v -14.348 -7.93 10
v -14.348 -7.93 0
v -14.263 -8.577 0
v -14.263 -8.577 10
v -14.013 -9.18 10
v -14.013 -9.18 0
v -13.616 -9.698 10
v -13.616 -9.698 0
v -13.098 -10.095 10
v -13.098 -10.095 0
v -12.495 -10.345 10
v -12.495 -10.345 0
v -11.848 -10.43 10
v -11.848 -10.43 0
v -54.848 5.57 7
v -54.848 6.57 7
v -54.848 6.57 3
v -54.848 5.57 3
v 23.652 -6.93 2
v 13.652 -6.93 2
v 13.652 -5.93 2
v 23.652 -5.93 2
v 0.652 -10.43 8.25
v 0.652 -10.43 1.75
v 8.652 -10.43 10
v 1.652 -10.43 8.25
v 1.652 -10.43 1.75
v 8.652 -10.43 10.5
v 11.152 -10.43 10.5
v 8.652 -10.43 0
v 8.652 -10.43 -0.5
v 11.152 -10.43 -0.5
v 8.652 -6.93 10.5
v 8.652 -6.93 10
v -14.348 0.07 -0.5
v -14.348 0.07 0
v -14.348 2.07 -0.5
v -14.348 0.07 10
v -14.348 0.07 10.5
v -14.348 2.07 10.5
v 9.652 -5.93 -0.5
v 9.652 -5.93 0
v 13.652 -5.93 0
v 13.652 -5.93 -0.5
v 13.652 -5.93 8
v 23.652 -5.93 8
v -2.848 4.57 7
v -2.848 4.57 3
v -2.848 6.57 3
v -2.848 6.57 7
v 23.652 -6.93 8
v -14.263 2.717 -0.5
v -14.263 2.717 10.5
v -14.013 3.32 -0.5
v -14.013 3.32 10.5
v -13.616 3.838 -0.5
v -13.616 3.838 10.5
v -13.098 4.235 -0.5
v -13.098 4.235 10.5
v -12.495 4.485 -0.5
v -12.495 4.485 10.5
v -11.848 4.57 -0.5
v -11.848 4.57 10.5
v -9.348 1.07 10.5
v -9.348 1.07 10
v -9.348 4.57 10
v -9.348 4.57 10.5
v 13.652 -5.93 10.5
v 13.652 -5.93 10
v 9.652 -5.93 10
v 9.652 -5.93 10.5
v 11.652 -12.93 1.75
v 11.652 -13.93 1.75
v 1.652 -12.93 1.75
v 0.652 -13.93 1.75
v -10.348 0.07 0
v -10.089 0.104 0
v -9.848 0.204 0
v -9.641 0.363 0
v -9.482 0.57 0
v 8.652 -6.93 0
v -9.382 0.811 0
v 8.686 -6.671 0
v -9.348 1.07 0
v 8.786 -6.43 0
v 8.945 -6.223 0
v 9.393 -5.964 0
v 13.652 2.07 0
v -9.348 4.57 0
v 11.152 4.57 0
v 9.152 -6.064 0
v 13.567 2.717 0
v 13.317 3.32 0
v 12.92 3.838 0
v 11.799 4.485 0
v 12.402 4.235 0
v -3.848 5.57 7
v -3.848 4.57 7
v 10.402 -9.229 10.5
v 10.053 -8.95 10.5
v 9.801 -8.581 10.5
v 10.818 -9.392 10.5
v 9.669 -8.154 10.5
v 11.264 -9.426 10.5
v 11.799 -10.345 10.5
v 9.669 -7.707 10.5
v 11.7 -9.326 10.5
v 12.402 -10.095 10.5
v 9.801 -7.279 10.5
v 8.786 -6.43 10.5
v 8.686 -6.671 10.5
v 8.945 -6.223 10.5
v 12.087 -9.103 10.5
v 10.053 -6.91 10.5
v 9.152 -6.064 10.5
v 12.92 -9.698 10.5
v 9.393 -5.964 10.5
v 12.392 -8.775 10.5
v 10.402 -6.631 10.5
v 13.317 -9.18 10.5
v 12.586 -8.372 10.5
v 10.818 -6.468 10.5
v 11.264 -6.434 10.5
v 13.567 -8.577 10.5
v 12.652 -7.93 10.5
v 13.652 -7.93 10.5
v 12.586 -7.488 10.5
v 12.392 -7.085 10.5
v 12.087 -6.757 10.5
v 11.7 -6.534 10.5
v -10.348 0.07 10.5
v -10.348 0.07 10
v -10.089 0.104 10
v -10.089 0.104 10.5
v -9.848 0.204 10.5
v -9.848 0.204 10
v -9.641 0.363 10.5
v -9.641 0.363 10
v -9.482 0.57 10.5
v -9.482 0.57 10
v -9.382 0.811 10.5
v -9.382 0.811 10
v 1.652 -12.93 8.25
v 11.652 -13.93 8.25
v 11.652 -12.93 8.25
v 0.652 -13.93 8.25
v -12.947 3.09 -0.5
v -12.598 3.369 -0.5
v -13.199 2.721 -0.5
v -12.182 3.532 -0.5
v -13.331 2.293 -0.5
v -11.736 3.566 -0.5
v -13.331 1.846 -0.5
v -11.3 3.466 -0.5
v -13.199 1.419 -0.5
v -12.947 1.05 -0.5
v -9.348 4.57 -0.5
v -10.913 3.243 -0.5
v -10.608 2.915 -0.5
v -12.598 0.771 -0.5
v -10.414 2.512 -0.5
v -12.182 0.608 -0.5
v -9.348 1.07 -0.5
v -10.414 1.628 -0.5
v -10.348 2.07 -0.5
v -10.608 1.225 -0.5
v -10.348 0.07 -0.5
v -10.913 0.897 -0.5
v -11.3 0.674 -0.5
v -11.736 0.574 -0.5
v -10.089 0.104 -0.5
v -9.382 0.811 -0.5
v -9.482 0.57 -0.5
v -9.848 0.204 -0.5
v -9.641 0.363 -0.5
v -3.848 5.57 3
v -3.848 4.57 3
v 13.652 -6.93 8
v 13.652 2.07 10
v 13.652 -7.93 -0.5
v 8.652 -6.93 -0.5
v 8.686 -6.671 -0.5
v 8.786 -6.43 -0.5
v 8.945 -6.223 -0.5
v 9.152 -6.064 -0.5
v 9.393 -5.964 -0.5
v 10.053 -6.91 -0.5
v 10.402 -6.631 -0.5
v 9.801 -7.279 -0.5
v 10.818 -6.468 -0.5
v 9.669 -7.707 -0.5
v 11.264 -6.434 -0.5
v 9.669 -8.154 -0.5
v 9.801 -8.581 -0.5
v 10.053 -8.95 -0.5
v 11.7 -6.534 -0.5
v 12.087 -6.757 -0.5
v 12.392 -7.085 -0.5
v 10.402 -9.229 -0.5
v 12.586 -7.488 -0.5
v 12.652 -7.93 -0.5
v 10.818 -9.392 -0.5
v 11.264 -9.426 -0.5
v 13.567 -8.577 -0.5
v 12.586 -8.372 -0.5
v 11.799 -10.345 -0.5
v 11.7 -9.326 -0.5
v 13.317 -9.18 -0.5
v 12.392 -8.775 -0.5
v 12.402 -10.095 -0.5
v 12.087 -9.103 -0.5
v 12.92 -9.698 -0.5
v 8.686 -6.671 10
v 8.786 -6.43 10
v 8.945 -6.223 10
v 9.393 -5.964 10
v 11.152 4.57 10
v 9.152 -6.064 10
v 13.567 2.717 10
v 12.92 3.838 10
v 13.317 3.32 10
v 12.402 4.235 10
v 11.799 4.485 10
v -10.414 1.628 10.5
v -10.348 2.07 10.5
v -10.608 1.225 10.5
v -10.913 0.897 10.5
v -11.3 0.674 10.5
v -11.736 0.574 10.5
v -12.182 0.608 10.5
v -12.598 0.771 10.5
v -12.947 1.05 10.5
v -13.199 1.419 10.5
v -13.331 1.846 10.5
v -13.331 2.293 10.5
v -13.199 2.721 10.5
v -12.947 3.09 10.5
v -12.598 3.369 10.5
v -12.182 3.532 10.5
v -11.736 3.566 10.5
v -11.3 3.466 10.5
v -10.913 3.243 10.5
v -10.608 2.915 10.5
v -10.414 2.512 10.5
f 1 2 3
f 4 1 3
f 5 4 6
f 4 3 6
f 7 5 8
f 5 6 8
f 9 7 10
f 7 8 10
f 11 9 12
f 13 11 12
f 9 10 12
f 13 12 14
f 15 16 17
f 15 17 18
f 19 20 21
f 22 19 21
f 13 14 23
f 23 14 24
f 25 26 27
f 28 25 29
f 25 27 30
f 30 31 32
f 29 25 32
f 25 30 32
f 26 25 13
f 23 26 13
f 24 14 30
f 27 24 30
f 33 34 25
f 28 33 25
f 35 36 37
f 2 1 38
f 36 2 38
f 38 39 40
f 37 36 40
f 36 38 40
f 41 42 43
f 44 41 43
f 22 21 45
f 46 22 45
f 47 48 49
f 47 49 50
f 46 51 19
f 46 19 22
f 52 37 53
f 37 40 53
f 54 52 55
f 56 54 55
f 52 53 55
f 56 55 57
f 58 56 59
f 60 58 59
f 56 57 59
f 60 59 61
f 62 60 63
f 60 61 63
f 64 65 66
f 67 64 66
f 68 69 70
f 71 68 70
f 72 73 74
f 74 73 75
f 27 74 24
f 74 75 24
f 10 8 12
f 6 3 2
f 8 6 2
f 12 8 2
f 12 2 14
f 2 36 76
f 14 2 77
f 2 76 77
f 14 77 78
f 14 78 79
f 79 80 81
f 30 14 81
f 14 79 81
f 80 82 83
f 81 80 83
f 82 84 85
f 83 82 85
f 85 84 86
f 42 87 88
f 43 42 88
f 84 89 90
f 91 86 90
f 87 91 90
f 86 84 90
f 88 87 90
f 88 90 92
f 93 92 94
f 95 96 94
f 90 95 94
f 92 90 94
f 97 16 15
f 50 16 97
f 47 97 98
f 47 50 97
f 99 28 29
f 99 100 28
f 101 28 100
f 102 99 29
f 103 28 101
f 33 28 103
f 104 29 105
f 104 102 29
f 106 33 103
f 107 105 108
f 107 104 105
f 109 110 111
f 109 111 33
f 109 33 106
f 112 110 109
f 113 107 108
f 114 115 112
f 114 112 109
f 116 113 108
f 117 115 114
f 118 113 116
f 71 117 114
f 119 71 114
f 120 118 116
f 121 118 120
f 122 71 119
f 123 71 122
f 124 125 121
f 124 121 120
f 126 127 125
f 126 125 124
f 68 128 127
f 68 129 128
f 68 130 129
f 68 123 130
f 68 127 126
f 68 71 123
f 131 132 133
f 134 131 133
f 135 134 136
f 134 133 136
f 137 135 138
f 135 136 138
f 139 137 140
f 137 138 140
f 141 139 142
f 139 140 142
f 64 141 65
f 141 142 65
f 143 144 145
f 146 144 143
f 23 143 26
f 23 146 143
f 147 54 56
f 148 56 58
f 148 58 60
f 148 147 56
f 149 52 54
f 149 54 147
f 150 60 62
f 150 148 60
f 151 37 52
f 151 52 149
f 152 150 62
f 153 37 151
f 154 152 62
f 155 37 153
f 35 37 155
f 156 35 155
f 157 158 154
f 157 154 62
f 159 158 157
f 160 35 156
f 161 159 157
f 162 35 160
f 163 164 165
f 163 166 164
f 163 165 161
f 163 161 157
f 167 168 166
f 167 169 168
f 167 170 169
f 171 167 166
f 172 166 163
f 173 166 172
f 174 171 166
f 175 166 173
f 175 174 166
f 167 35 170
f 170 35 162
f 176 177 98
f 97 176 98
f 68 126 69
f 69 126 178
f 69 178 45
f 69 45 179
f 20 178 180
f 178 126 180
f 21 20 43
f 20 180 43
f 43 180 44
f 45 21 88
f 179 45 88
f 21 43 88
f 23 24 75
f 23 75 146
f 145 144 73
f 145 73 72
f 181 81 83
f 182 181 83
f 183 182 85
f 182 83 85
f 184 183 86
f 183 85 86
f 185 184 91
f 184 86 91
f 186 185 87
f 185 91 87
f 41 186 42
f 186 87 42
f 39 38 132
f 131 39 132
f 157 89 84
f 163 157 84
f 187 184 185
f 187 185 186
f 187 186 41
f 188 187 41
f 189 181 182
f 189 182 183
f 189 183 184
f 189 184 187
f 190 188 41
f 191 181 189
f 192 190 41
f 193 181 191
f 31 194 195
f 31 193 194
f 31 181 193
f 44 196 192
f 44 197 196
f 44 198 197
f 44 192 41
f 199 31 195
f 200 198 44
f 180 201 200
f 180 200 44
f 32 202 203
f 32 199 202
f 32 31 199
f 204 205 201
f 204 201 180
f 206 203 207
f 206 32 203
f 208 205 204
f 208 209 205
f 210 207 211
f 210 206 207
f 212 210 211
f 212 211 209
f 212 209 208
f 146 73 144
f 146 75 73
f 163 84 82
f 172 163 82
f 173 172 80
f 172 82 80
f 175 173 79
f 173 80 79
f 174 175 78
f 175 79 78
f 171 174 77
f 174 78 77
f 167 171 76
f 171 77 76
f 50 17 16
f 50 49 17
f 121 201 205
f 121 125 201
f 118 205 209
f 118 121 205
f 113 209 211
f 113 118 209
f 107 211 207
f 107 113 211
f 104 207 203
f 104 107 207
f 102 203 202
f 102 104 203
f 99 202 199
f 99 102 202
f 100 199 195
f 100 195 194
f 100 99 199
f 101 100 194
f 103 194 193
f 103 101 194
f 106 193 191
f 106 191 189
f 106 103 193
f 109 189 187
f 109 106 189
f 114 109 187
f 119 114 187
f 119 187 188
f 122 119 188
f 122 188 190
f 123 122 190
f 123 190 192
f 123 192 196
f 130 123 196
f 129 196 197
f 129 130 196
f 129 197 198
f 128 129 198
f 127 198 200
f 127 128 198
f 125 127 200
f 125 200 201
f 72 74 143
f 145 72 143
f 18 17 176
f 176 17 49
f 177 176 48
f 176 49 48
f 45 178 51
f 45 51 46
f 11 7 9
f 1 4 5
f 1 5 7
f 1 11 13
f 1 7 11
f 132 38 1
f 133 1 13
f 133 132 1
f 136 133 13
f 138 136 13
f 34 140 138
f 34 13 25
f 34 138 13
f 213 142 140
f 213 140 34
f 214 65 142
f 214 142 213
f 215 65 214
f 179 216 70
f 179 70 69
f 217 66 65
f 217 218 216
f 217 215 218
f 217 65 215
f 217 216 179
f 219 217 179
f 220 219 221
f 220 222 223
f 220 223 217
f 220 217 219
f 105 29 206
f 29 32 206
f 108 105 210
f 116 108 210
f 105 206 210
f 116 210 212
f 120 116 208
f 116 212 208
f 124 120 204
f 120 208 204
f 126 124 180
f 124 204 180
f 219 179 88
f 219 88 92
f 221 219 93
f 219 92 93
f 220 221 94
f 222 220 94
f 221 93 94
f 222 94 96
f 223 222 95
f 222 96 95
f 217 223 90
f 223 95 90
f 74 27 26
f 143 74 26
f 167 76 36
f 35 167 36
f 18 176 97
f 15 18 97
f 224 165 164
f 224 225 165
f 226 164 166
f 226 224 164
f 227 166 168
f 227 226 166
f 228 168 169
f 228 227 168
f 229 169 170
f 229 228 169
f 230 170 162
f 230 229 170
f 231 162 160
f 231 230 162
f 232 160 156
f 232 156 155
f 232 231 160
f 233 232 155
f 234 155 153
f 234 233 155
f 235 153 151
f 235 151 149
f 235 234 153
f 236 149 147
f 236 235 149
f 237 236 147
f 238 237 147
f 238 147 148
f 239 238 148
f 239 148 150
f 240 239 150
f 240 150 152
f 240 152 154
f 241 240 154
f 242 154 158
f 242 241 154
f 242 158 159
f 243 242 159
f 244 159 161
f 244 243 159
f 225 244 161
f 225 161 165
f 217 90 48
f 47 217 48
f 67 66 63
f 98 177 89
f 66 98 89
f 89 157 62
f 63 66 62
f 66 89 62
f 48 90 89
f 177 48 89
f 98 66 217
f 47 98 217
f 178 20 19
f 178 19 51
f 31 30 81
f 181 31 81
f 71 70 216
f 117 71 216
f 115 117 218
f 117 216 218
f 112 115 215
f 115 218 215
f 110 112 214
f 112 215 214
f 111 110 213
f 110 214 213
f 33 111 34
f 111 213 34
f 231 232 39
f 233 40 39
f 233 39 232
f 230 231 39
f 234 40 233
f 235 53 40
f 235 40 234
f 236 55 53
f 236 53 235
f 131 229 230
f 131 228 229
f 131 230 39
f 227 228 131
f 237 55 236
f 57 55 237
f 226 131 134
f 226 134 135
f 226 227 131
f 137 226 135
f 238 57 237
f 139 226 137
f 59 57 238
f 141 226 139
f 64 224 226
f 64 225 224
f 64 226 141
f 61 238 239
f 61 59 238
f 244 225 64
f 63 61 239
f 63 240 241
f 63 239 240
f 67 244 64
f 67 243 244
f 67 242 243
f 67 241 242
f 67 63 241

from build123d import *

# Parameters (mm, degrees)
F1_DEPTH  = 10
F2_R      = 1.5
F3_DEPTH  = 15
F4_R      = 1.5
F5_DEPTH  = 0.5
F6_R      = 1.5
F7_DEPTH  = 0.5
F8_W      = 1
F8_H      = 6
F9_DEPTH  = 10
F10_W     = 1
F10_H     = 6.5
F11_DEPTH = 3.5
F12_W     = 1
F12_H     = 6.5
F13_DEPTH = 10
F14_W     = 1
F14_H     = 4
F15_DEPTH = 2
F16_W     = 1
F16_H     = 4
F17_DEPTH = 51


with BuildPart() as f1:
    # F0 (on Top) → F1 (new body)
    with BuildSketch(Plane.XY):
        with BuildLine():
            Line((11.152231, 4.569918), (-11.847769, 4.569918))
            ThreePointArc((-11.847769, 4.569918), (-13.615536, 3.837685), (-14.347769, 2.069918))
            Line((-14.347769, 2.069918), (-14.347769, -7.930082))
            ThreePointArc((-14.347769, -7.930082), (-13.615536, -9.697848), (-11.847769, -10.430082))
            Line((-11.847769, -10.430082), (11.152231, -10.430082))
            ThreePointArc((11.152231, -10.430082), (12.919998, -9.697848), (13.652231, -7.930082))
            Line((13.652231, -7.930082), (13.652231, 2.069918))
            ThreePointArc((13.652231, 2.069918), (12.919998, 3.837685), (11.152231, 4.569918))
        make_face()
    extrude(amount=F1_DEPTH)

    # F2 (on face) → F3 (cut)
    with BuildSketch(Plane.XY.offset(10)):
        with Locations((-11.847769, 2.069918)):
            Circle(F2_R)
        with Locations((11.152231, -7.930082)):
            Circle(F2_R)
    extrude(amount=-F3_DEPTH, mode=Mode.SUBTRACT)

    # F4 (on face) → F5 (join)
    with BuildSketch(Plane.XY.offset(10)):
        with BuildLine():
            Line((-9.347769, 1.069918), (-9.347769, 4.569918))
            Line((-9.347769, 4.569918), (-11.847769, 4.569918))
            ThreePointArc((-11.847769, 4.569918), (-13.615536, 3.837685), (-14.347769, 2.069918))
            Line((-14.347769, 2.069918), (-14.347769, 0.069918))
            Line((-14.347769, 0.069918), (-10.347769, 0.069918))
            ThreePointArc((-10.347769, 0.069918), (-9.640663, 0.362812), (-9.347769, 1.069918))
        make_face()
        with Locations((-11.847769, 2.069918)):
            Circle(F4_R, mode=Mode.SUBTRACT)
        with BuildLine():
            Line((13.652231, -7.930082), (13.652231, -5.930082))
            Line((13.652231, -5.930082), (9.652231, -5.930082))
            ThreePointArc((9.652231, -5.930082), (8.945124, -6.222975), (8.652231, -6.930082))
            Line((8.652231, -6.930082), (8.652231, -10.430082))
            Line((8.652231, -10.430082), (11.152231, -10.430082))
            ThreePointArc((11.152231, -10.430082), (12.919998, -9.697848), (13.652231, -7.930082))
        make_face()
        with Locations((11.152231, -7.930082)):
            Circle(F4_R, mode=Mode.SUBTRACT)
    extrude(amount=F5_DEPTH)

    # F6 (on face) → F7 (join)
    with BuildSketch(Plane(origin=(0, 0, 0), x_dir=(1, 0, 0), z_dir=(0, 0, -1))):
        with BuildLine():
            Line((-10.347769, -0.069918), (-14.347769, -0.069918))
            Line((-14.347769, -0.069918), (-14.347769, -2.069918))
            ThreePointArc((-14.347769, -2.069918), (-13.615536, -3.837685), (-11.847769, -4.569918))
            Line((-11.847769, -4.569918), (-9.347769, -4.569918))
            Line((-9.347769, -4.569918), (-9.347769, -1.069918))
            ThreePointArc((-9.347769, -1.069918), (-9.640663, -0.362812), (-10.347769, -0.069918))
        make_face()
        with Locations((-11.847769, -2.069918)):
            Circle(F6_R, mode=Mode.SUBTRACT)
        with BuildLine():
            Line((11.152231, 10.430082), (8.652231, 10.430082))
            Line((8.652231, 10.430082), (8.652231, 6.930082))
            ThreePointArc((8.652231, 6.930082), (8.945124, 6.222975), (9.652231, 5.930082))
            Line((9.652231, 5.930082), (13.652231, 5.930082))
            Line((13.652231, 5.930082), (13.652231, 7.930082))
            ThreePointArc((13.652231, 7.930082), (12.919998, 9.697848), (11.152231, 10.430082))
        make_face()
        with Locations((11.152231, 7.930082)):
            Circle(F6_R, mode=Mode.SUBTRACT)
    extrude(amount=F7_DEPTH)

    # F8 (on face) → F9 (join)
    with BuildSketch(Plane.YZ.offset(13.652231)):
        with Locations((-6.430082, 5)):
            Rectangle(F8_W, F8_H)
    extrude(amount=F9_DEPTH)

    # F10 (on face) → F11 (join)
    with BuildSketch(Plane.XZ.offset(10.430082)):
        with Locations((1.152231, 5)):
            Rectangle(F10_W, F10_H)
    extrude(amount=F11_DEPTH)

    # F12 (on face) → F13 (join)
    with BuildSketch(Plane.YZ.offset(1.652231)):
        with Locations((-13.430082, 5)):
            Rectangle(F12_W, F12_H)
    extrude(amount=F13_DEPTH)

    # F14 (on face) → F15 (join)
    with BuildSketch(Plane(origin=(0, 4.569918, 0), x_dir=(-1, 0, 0), z_dir=(0, 1, 0))):
        with Locations((3.347769, 5)):
            Rectangle(F14_W, F14_H)
    extrude(amount=F15_DEPTH)

    # F16 (on face) → F17 (join)
    with BuildSketch(Plane(origin=(-3.847769, 0, 0), x_dir=(0, -1, 0), z_dir=(-1, 0, 0))):
        with Locations((-6.069918, 5)):
            Rectangle(F16_W, F16_H)
    extrude(amount=F17_DEPTH)


solid = f1.part
